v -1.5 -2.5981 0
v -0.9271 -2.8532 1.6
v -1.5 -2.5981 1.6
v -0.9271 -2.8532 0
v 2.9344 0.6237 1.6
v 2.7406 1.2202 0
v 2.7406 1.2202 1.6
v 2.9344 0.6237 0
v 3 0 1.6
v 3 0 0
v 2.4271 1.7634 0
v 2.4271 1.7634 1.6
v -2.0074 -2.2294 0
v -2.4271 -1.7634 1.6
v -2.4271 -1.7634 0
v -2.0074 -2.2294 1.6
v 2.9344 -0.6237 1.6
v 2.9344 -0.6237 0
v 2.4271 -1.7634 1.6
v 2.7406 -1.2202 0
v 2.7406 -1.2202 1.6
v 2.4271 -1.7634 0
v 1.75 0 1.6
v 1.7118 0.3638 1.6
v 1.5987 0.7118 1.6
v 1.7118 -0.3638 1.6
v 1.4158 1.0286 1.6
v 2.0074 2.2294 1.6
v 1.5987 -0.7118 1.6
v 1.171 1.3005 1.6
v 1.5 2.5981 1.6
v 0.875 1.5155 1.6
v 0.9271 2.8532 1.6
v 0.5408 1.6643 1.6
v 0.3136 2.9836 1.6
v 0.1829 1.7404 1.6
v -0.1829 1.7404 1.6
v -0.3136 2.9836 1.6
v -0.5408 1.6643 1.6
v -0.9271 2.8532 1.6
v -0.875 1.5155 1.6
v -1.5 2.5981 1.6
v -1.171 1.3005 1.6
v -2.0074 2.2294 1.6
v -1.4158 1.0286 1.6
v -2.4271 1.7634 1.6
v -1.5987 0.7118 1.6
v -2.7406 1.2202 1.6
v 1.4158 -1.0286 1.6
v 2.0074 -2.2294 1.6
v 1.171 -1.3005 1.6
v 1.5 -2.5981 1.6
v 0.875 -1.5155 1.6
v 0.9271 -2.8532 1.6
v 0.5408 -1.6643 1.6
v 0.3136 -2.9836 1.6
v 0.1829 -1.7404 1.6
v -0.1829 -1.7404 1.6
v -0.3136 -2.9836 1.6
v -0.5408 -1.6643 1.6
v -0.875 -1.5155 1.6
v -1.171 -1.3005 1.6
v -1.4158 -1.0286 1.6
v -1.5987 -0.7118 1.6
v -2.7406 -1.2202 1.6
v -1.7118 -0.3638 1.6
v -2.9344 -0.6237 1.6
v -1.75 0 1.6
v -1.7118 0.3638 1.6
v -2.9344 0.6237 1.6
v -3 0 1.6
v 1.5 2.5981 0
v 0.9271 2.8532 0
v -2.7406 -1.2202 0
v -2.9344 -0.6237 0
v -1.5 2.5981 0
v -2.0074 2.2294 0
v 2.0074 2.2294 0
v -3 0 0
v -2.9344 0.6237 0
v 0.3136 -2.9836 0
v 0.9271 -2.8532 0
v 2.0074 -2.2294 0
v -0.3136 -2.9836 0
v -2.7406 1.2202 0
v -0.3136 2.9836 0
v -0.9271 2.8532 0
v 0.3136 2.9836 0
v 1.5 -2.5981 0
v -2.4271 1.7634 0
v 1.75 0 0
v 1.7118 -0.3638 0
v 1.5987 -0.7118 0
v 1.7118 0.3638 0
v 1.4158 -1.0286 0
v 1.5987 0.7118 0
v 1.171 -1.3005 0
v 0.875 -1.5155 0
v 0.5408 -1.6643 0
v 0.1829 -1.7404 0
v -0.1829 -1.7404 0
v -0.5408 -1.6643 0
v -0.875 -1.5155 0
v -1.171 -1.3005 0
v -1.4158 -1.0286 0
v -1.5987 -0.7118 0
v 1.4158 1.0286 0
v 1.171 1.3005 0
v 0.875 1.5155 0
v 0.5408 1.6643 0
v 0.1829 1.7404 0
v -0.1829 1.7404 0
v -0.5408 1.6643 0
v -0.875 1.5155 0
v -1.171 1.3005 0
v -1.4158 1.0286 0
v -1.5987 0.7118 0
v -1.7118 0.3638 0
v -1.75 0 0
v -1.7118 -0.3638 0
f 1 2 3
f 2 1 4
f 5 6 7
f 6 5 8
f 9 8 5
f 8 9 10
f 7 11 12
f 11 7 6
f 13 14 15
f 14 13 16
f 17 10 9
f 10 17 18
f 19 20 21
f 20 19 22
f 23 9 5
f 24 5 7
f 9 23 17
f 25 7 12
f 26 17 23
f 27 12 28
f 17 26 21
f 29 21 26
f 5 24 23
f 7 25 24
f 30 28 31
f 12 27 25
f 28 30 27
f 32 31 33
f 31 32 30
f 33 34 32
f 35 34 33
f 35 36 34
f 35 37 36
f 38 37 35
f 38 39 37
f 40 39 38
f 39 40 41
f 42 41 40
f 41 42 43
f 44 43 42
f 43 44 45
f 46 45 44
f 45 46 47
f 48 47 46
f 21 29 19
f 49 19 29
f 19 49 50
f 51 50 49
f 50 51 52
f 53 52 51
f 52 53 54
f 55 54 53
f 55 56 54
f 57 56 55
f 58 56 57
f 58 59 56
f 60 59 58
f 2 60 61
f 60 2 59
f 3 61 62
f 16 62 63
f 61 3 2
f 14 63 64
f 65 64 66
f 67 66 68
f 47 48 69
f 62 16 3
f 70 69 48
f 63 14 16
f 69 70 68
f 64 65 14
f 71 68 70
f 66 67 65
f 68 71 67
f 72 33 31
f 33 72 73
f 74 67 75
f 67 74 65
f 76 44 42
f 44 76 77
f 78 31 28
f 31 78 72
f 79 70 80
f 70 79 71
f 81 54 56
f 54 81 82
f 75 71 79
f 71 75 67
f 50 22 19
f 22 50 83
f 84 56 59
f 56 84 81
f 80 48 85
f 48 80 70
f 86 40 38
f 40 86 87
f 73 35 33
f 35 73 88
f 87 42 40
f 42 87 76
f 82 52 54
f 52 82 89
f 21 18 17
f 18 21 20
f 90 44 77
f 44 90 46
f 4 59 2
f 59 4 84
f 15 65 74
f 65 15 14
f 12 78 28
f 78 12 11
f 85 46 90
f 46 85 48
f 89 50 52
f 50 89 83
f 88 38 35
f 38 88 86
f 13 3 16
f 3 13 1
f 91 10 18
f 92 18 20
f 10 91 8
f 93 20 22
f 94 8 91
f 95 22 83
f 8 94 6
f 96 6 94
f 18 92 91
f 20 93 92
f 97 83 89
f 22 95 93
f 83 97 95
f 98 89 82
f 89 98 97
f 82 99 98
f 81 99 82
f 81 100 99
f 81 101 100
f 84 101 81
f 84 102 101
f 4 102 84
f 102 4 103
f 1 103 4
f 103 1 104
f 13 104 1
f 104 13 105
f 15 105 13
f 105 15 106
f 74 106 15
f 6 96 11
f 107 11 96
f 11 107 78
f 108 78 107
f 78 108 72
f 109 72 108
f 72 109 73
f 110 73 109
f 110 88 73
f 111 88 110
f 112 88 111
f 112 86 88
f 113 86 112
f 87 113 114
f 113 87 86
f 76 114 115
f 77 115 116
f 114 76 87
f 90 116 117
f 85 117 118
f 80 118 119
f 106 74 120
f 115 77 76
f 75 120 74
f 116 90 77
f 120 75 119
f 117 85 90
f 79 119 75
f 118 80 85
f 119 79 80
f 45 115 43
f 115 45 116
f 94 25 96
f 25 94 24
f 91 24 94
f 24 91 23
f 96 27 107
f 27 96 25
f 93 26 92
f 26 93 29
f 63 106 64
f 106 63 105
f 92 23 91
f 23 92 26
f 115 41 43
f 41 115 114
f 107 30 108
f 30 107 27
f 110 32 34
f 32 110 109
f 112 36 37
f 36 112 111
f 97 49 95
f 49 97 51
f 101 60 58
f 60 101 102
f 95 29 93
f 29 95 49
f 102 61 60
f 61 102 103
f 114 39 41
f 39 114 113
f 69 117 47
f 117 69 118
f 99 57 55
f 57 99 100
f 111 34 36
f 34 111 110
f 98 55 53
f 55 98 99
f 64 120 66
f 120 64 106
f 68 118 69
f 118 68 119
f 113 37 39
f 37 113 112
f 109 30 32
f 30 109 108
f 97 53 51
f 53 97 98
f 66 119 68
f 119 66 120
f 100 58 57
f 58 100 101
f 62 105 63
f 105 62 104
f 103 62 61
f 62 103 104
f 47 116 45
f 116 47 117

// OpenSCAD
difference() {
	height=5.2+0.5-1.5-1-1.6;
	$fs=0.1;
	cylinder(r=3, h=height);
	cylinder(r=1.75, h=height);
}
